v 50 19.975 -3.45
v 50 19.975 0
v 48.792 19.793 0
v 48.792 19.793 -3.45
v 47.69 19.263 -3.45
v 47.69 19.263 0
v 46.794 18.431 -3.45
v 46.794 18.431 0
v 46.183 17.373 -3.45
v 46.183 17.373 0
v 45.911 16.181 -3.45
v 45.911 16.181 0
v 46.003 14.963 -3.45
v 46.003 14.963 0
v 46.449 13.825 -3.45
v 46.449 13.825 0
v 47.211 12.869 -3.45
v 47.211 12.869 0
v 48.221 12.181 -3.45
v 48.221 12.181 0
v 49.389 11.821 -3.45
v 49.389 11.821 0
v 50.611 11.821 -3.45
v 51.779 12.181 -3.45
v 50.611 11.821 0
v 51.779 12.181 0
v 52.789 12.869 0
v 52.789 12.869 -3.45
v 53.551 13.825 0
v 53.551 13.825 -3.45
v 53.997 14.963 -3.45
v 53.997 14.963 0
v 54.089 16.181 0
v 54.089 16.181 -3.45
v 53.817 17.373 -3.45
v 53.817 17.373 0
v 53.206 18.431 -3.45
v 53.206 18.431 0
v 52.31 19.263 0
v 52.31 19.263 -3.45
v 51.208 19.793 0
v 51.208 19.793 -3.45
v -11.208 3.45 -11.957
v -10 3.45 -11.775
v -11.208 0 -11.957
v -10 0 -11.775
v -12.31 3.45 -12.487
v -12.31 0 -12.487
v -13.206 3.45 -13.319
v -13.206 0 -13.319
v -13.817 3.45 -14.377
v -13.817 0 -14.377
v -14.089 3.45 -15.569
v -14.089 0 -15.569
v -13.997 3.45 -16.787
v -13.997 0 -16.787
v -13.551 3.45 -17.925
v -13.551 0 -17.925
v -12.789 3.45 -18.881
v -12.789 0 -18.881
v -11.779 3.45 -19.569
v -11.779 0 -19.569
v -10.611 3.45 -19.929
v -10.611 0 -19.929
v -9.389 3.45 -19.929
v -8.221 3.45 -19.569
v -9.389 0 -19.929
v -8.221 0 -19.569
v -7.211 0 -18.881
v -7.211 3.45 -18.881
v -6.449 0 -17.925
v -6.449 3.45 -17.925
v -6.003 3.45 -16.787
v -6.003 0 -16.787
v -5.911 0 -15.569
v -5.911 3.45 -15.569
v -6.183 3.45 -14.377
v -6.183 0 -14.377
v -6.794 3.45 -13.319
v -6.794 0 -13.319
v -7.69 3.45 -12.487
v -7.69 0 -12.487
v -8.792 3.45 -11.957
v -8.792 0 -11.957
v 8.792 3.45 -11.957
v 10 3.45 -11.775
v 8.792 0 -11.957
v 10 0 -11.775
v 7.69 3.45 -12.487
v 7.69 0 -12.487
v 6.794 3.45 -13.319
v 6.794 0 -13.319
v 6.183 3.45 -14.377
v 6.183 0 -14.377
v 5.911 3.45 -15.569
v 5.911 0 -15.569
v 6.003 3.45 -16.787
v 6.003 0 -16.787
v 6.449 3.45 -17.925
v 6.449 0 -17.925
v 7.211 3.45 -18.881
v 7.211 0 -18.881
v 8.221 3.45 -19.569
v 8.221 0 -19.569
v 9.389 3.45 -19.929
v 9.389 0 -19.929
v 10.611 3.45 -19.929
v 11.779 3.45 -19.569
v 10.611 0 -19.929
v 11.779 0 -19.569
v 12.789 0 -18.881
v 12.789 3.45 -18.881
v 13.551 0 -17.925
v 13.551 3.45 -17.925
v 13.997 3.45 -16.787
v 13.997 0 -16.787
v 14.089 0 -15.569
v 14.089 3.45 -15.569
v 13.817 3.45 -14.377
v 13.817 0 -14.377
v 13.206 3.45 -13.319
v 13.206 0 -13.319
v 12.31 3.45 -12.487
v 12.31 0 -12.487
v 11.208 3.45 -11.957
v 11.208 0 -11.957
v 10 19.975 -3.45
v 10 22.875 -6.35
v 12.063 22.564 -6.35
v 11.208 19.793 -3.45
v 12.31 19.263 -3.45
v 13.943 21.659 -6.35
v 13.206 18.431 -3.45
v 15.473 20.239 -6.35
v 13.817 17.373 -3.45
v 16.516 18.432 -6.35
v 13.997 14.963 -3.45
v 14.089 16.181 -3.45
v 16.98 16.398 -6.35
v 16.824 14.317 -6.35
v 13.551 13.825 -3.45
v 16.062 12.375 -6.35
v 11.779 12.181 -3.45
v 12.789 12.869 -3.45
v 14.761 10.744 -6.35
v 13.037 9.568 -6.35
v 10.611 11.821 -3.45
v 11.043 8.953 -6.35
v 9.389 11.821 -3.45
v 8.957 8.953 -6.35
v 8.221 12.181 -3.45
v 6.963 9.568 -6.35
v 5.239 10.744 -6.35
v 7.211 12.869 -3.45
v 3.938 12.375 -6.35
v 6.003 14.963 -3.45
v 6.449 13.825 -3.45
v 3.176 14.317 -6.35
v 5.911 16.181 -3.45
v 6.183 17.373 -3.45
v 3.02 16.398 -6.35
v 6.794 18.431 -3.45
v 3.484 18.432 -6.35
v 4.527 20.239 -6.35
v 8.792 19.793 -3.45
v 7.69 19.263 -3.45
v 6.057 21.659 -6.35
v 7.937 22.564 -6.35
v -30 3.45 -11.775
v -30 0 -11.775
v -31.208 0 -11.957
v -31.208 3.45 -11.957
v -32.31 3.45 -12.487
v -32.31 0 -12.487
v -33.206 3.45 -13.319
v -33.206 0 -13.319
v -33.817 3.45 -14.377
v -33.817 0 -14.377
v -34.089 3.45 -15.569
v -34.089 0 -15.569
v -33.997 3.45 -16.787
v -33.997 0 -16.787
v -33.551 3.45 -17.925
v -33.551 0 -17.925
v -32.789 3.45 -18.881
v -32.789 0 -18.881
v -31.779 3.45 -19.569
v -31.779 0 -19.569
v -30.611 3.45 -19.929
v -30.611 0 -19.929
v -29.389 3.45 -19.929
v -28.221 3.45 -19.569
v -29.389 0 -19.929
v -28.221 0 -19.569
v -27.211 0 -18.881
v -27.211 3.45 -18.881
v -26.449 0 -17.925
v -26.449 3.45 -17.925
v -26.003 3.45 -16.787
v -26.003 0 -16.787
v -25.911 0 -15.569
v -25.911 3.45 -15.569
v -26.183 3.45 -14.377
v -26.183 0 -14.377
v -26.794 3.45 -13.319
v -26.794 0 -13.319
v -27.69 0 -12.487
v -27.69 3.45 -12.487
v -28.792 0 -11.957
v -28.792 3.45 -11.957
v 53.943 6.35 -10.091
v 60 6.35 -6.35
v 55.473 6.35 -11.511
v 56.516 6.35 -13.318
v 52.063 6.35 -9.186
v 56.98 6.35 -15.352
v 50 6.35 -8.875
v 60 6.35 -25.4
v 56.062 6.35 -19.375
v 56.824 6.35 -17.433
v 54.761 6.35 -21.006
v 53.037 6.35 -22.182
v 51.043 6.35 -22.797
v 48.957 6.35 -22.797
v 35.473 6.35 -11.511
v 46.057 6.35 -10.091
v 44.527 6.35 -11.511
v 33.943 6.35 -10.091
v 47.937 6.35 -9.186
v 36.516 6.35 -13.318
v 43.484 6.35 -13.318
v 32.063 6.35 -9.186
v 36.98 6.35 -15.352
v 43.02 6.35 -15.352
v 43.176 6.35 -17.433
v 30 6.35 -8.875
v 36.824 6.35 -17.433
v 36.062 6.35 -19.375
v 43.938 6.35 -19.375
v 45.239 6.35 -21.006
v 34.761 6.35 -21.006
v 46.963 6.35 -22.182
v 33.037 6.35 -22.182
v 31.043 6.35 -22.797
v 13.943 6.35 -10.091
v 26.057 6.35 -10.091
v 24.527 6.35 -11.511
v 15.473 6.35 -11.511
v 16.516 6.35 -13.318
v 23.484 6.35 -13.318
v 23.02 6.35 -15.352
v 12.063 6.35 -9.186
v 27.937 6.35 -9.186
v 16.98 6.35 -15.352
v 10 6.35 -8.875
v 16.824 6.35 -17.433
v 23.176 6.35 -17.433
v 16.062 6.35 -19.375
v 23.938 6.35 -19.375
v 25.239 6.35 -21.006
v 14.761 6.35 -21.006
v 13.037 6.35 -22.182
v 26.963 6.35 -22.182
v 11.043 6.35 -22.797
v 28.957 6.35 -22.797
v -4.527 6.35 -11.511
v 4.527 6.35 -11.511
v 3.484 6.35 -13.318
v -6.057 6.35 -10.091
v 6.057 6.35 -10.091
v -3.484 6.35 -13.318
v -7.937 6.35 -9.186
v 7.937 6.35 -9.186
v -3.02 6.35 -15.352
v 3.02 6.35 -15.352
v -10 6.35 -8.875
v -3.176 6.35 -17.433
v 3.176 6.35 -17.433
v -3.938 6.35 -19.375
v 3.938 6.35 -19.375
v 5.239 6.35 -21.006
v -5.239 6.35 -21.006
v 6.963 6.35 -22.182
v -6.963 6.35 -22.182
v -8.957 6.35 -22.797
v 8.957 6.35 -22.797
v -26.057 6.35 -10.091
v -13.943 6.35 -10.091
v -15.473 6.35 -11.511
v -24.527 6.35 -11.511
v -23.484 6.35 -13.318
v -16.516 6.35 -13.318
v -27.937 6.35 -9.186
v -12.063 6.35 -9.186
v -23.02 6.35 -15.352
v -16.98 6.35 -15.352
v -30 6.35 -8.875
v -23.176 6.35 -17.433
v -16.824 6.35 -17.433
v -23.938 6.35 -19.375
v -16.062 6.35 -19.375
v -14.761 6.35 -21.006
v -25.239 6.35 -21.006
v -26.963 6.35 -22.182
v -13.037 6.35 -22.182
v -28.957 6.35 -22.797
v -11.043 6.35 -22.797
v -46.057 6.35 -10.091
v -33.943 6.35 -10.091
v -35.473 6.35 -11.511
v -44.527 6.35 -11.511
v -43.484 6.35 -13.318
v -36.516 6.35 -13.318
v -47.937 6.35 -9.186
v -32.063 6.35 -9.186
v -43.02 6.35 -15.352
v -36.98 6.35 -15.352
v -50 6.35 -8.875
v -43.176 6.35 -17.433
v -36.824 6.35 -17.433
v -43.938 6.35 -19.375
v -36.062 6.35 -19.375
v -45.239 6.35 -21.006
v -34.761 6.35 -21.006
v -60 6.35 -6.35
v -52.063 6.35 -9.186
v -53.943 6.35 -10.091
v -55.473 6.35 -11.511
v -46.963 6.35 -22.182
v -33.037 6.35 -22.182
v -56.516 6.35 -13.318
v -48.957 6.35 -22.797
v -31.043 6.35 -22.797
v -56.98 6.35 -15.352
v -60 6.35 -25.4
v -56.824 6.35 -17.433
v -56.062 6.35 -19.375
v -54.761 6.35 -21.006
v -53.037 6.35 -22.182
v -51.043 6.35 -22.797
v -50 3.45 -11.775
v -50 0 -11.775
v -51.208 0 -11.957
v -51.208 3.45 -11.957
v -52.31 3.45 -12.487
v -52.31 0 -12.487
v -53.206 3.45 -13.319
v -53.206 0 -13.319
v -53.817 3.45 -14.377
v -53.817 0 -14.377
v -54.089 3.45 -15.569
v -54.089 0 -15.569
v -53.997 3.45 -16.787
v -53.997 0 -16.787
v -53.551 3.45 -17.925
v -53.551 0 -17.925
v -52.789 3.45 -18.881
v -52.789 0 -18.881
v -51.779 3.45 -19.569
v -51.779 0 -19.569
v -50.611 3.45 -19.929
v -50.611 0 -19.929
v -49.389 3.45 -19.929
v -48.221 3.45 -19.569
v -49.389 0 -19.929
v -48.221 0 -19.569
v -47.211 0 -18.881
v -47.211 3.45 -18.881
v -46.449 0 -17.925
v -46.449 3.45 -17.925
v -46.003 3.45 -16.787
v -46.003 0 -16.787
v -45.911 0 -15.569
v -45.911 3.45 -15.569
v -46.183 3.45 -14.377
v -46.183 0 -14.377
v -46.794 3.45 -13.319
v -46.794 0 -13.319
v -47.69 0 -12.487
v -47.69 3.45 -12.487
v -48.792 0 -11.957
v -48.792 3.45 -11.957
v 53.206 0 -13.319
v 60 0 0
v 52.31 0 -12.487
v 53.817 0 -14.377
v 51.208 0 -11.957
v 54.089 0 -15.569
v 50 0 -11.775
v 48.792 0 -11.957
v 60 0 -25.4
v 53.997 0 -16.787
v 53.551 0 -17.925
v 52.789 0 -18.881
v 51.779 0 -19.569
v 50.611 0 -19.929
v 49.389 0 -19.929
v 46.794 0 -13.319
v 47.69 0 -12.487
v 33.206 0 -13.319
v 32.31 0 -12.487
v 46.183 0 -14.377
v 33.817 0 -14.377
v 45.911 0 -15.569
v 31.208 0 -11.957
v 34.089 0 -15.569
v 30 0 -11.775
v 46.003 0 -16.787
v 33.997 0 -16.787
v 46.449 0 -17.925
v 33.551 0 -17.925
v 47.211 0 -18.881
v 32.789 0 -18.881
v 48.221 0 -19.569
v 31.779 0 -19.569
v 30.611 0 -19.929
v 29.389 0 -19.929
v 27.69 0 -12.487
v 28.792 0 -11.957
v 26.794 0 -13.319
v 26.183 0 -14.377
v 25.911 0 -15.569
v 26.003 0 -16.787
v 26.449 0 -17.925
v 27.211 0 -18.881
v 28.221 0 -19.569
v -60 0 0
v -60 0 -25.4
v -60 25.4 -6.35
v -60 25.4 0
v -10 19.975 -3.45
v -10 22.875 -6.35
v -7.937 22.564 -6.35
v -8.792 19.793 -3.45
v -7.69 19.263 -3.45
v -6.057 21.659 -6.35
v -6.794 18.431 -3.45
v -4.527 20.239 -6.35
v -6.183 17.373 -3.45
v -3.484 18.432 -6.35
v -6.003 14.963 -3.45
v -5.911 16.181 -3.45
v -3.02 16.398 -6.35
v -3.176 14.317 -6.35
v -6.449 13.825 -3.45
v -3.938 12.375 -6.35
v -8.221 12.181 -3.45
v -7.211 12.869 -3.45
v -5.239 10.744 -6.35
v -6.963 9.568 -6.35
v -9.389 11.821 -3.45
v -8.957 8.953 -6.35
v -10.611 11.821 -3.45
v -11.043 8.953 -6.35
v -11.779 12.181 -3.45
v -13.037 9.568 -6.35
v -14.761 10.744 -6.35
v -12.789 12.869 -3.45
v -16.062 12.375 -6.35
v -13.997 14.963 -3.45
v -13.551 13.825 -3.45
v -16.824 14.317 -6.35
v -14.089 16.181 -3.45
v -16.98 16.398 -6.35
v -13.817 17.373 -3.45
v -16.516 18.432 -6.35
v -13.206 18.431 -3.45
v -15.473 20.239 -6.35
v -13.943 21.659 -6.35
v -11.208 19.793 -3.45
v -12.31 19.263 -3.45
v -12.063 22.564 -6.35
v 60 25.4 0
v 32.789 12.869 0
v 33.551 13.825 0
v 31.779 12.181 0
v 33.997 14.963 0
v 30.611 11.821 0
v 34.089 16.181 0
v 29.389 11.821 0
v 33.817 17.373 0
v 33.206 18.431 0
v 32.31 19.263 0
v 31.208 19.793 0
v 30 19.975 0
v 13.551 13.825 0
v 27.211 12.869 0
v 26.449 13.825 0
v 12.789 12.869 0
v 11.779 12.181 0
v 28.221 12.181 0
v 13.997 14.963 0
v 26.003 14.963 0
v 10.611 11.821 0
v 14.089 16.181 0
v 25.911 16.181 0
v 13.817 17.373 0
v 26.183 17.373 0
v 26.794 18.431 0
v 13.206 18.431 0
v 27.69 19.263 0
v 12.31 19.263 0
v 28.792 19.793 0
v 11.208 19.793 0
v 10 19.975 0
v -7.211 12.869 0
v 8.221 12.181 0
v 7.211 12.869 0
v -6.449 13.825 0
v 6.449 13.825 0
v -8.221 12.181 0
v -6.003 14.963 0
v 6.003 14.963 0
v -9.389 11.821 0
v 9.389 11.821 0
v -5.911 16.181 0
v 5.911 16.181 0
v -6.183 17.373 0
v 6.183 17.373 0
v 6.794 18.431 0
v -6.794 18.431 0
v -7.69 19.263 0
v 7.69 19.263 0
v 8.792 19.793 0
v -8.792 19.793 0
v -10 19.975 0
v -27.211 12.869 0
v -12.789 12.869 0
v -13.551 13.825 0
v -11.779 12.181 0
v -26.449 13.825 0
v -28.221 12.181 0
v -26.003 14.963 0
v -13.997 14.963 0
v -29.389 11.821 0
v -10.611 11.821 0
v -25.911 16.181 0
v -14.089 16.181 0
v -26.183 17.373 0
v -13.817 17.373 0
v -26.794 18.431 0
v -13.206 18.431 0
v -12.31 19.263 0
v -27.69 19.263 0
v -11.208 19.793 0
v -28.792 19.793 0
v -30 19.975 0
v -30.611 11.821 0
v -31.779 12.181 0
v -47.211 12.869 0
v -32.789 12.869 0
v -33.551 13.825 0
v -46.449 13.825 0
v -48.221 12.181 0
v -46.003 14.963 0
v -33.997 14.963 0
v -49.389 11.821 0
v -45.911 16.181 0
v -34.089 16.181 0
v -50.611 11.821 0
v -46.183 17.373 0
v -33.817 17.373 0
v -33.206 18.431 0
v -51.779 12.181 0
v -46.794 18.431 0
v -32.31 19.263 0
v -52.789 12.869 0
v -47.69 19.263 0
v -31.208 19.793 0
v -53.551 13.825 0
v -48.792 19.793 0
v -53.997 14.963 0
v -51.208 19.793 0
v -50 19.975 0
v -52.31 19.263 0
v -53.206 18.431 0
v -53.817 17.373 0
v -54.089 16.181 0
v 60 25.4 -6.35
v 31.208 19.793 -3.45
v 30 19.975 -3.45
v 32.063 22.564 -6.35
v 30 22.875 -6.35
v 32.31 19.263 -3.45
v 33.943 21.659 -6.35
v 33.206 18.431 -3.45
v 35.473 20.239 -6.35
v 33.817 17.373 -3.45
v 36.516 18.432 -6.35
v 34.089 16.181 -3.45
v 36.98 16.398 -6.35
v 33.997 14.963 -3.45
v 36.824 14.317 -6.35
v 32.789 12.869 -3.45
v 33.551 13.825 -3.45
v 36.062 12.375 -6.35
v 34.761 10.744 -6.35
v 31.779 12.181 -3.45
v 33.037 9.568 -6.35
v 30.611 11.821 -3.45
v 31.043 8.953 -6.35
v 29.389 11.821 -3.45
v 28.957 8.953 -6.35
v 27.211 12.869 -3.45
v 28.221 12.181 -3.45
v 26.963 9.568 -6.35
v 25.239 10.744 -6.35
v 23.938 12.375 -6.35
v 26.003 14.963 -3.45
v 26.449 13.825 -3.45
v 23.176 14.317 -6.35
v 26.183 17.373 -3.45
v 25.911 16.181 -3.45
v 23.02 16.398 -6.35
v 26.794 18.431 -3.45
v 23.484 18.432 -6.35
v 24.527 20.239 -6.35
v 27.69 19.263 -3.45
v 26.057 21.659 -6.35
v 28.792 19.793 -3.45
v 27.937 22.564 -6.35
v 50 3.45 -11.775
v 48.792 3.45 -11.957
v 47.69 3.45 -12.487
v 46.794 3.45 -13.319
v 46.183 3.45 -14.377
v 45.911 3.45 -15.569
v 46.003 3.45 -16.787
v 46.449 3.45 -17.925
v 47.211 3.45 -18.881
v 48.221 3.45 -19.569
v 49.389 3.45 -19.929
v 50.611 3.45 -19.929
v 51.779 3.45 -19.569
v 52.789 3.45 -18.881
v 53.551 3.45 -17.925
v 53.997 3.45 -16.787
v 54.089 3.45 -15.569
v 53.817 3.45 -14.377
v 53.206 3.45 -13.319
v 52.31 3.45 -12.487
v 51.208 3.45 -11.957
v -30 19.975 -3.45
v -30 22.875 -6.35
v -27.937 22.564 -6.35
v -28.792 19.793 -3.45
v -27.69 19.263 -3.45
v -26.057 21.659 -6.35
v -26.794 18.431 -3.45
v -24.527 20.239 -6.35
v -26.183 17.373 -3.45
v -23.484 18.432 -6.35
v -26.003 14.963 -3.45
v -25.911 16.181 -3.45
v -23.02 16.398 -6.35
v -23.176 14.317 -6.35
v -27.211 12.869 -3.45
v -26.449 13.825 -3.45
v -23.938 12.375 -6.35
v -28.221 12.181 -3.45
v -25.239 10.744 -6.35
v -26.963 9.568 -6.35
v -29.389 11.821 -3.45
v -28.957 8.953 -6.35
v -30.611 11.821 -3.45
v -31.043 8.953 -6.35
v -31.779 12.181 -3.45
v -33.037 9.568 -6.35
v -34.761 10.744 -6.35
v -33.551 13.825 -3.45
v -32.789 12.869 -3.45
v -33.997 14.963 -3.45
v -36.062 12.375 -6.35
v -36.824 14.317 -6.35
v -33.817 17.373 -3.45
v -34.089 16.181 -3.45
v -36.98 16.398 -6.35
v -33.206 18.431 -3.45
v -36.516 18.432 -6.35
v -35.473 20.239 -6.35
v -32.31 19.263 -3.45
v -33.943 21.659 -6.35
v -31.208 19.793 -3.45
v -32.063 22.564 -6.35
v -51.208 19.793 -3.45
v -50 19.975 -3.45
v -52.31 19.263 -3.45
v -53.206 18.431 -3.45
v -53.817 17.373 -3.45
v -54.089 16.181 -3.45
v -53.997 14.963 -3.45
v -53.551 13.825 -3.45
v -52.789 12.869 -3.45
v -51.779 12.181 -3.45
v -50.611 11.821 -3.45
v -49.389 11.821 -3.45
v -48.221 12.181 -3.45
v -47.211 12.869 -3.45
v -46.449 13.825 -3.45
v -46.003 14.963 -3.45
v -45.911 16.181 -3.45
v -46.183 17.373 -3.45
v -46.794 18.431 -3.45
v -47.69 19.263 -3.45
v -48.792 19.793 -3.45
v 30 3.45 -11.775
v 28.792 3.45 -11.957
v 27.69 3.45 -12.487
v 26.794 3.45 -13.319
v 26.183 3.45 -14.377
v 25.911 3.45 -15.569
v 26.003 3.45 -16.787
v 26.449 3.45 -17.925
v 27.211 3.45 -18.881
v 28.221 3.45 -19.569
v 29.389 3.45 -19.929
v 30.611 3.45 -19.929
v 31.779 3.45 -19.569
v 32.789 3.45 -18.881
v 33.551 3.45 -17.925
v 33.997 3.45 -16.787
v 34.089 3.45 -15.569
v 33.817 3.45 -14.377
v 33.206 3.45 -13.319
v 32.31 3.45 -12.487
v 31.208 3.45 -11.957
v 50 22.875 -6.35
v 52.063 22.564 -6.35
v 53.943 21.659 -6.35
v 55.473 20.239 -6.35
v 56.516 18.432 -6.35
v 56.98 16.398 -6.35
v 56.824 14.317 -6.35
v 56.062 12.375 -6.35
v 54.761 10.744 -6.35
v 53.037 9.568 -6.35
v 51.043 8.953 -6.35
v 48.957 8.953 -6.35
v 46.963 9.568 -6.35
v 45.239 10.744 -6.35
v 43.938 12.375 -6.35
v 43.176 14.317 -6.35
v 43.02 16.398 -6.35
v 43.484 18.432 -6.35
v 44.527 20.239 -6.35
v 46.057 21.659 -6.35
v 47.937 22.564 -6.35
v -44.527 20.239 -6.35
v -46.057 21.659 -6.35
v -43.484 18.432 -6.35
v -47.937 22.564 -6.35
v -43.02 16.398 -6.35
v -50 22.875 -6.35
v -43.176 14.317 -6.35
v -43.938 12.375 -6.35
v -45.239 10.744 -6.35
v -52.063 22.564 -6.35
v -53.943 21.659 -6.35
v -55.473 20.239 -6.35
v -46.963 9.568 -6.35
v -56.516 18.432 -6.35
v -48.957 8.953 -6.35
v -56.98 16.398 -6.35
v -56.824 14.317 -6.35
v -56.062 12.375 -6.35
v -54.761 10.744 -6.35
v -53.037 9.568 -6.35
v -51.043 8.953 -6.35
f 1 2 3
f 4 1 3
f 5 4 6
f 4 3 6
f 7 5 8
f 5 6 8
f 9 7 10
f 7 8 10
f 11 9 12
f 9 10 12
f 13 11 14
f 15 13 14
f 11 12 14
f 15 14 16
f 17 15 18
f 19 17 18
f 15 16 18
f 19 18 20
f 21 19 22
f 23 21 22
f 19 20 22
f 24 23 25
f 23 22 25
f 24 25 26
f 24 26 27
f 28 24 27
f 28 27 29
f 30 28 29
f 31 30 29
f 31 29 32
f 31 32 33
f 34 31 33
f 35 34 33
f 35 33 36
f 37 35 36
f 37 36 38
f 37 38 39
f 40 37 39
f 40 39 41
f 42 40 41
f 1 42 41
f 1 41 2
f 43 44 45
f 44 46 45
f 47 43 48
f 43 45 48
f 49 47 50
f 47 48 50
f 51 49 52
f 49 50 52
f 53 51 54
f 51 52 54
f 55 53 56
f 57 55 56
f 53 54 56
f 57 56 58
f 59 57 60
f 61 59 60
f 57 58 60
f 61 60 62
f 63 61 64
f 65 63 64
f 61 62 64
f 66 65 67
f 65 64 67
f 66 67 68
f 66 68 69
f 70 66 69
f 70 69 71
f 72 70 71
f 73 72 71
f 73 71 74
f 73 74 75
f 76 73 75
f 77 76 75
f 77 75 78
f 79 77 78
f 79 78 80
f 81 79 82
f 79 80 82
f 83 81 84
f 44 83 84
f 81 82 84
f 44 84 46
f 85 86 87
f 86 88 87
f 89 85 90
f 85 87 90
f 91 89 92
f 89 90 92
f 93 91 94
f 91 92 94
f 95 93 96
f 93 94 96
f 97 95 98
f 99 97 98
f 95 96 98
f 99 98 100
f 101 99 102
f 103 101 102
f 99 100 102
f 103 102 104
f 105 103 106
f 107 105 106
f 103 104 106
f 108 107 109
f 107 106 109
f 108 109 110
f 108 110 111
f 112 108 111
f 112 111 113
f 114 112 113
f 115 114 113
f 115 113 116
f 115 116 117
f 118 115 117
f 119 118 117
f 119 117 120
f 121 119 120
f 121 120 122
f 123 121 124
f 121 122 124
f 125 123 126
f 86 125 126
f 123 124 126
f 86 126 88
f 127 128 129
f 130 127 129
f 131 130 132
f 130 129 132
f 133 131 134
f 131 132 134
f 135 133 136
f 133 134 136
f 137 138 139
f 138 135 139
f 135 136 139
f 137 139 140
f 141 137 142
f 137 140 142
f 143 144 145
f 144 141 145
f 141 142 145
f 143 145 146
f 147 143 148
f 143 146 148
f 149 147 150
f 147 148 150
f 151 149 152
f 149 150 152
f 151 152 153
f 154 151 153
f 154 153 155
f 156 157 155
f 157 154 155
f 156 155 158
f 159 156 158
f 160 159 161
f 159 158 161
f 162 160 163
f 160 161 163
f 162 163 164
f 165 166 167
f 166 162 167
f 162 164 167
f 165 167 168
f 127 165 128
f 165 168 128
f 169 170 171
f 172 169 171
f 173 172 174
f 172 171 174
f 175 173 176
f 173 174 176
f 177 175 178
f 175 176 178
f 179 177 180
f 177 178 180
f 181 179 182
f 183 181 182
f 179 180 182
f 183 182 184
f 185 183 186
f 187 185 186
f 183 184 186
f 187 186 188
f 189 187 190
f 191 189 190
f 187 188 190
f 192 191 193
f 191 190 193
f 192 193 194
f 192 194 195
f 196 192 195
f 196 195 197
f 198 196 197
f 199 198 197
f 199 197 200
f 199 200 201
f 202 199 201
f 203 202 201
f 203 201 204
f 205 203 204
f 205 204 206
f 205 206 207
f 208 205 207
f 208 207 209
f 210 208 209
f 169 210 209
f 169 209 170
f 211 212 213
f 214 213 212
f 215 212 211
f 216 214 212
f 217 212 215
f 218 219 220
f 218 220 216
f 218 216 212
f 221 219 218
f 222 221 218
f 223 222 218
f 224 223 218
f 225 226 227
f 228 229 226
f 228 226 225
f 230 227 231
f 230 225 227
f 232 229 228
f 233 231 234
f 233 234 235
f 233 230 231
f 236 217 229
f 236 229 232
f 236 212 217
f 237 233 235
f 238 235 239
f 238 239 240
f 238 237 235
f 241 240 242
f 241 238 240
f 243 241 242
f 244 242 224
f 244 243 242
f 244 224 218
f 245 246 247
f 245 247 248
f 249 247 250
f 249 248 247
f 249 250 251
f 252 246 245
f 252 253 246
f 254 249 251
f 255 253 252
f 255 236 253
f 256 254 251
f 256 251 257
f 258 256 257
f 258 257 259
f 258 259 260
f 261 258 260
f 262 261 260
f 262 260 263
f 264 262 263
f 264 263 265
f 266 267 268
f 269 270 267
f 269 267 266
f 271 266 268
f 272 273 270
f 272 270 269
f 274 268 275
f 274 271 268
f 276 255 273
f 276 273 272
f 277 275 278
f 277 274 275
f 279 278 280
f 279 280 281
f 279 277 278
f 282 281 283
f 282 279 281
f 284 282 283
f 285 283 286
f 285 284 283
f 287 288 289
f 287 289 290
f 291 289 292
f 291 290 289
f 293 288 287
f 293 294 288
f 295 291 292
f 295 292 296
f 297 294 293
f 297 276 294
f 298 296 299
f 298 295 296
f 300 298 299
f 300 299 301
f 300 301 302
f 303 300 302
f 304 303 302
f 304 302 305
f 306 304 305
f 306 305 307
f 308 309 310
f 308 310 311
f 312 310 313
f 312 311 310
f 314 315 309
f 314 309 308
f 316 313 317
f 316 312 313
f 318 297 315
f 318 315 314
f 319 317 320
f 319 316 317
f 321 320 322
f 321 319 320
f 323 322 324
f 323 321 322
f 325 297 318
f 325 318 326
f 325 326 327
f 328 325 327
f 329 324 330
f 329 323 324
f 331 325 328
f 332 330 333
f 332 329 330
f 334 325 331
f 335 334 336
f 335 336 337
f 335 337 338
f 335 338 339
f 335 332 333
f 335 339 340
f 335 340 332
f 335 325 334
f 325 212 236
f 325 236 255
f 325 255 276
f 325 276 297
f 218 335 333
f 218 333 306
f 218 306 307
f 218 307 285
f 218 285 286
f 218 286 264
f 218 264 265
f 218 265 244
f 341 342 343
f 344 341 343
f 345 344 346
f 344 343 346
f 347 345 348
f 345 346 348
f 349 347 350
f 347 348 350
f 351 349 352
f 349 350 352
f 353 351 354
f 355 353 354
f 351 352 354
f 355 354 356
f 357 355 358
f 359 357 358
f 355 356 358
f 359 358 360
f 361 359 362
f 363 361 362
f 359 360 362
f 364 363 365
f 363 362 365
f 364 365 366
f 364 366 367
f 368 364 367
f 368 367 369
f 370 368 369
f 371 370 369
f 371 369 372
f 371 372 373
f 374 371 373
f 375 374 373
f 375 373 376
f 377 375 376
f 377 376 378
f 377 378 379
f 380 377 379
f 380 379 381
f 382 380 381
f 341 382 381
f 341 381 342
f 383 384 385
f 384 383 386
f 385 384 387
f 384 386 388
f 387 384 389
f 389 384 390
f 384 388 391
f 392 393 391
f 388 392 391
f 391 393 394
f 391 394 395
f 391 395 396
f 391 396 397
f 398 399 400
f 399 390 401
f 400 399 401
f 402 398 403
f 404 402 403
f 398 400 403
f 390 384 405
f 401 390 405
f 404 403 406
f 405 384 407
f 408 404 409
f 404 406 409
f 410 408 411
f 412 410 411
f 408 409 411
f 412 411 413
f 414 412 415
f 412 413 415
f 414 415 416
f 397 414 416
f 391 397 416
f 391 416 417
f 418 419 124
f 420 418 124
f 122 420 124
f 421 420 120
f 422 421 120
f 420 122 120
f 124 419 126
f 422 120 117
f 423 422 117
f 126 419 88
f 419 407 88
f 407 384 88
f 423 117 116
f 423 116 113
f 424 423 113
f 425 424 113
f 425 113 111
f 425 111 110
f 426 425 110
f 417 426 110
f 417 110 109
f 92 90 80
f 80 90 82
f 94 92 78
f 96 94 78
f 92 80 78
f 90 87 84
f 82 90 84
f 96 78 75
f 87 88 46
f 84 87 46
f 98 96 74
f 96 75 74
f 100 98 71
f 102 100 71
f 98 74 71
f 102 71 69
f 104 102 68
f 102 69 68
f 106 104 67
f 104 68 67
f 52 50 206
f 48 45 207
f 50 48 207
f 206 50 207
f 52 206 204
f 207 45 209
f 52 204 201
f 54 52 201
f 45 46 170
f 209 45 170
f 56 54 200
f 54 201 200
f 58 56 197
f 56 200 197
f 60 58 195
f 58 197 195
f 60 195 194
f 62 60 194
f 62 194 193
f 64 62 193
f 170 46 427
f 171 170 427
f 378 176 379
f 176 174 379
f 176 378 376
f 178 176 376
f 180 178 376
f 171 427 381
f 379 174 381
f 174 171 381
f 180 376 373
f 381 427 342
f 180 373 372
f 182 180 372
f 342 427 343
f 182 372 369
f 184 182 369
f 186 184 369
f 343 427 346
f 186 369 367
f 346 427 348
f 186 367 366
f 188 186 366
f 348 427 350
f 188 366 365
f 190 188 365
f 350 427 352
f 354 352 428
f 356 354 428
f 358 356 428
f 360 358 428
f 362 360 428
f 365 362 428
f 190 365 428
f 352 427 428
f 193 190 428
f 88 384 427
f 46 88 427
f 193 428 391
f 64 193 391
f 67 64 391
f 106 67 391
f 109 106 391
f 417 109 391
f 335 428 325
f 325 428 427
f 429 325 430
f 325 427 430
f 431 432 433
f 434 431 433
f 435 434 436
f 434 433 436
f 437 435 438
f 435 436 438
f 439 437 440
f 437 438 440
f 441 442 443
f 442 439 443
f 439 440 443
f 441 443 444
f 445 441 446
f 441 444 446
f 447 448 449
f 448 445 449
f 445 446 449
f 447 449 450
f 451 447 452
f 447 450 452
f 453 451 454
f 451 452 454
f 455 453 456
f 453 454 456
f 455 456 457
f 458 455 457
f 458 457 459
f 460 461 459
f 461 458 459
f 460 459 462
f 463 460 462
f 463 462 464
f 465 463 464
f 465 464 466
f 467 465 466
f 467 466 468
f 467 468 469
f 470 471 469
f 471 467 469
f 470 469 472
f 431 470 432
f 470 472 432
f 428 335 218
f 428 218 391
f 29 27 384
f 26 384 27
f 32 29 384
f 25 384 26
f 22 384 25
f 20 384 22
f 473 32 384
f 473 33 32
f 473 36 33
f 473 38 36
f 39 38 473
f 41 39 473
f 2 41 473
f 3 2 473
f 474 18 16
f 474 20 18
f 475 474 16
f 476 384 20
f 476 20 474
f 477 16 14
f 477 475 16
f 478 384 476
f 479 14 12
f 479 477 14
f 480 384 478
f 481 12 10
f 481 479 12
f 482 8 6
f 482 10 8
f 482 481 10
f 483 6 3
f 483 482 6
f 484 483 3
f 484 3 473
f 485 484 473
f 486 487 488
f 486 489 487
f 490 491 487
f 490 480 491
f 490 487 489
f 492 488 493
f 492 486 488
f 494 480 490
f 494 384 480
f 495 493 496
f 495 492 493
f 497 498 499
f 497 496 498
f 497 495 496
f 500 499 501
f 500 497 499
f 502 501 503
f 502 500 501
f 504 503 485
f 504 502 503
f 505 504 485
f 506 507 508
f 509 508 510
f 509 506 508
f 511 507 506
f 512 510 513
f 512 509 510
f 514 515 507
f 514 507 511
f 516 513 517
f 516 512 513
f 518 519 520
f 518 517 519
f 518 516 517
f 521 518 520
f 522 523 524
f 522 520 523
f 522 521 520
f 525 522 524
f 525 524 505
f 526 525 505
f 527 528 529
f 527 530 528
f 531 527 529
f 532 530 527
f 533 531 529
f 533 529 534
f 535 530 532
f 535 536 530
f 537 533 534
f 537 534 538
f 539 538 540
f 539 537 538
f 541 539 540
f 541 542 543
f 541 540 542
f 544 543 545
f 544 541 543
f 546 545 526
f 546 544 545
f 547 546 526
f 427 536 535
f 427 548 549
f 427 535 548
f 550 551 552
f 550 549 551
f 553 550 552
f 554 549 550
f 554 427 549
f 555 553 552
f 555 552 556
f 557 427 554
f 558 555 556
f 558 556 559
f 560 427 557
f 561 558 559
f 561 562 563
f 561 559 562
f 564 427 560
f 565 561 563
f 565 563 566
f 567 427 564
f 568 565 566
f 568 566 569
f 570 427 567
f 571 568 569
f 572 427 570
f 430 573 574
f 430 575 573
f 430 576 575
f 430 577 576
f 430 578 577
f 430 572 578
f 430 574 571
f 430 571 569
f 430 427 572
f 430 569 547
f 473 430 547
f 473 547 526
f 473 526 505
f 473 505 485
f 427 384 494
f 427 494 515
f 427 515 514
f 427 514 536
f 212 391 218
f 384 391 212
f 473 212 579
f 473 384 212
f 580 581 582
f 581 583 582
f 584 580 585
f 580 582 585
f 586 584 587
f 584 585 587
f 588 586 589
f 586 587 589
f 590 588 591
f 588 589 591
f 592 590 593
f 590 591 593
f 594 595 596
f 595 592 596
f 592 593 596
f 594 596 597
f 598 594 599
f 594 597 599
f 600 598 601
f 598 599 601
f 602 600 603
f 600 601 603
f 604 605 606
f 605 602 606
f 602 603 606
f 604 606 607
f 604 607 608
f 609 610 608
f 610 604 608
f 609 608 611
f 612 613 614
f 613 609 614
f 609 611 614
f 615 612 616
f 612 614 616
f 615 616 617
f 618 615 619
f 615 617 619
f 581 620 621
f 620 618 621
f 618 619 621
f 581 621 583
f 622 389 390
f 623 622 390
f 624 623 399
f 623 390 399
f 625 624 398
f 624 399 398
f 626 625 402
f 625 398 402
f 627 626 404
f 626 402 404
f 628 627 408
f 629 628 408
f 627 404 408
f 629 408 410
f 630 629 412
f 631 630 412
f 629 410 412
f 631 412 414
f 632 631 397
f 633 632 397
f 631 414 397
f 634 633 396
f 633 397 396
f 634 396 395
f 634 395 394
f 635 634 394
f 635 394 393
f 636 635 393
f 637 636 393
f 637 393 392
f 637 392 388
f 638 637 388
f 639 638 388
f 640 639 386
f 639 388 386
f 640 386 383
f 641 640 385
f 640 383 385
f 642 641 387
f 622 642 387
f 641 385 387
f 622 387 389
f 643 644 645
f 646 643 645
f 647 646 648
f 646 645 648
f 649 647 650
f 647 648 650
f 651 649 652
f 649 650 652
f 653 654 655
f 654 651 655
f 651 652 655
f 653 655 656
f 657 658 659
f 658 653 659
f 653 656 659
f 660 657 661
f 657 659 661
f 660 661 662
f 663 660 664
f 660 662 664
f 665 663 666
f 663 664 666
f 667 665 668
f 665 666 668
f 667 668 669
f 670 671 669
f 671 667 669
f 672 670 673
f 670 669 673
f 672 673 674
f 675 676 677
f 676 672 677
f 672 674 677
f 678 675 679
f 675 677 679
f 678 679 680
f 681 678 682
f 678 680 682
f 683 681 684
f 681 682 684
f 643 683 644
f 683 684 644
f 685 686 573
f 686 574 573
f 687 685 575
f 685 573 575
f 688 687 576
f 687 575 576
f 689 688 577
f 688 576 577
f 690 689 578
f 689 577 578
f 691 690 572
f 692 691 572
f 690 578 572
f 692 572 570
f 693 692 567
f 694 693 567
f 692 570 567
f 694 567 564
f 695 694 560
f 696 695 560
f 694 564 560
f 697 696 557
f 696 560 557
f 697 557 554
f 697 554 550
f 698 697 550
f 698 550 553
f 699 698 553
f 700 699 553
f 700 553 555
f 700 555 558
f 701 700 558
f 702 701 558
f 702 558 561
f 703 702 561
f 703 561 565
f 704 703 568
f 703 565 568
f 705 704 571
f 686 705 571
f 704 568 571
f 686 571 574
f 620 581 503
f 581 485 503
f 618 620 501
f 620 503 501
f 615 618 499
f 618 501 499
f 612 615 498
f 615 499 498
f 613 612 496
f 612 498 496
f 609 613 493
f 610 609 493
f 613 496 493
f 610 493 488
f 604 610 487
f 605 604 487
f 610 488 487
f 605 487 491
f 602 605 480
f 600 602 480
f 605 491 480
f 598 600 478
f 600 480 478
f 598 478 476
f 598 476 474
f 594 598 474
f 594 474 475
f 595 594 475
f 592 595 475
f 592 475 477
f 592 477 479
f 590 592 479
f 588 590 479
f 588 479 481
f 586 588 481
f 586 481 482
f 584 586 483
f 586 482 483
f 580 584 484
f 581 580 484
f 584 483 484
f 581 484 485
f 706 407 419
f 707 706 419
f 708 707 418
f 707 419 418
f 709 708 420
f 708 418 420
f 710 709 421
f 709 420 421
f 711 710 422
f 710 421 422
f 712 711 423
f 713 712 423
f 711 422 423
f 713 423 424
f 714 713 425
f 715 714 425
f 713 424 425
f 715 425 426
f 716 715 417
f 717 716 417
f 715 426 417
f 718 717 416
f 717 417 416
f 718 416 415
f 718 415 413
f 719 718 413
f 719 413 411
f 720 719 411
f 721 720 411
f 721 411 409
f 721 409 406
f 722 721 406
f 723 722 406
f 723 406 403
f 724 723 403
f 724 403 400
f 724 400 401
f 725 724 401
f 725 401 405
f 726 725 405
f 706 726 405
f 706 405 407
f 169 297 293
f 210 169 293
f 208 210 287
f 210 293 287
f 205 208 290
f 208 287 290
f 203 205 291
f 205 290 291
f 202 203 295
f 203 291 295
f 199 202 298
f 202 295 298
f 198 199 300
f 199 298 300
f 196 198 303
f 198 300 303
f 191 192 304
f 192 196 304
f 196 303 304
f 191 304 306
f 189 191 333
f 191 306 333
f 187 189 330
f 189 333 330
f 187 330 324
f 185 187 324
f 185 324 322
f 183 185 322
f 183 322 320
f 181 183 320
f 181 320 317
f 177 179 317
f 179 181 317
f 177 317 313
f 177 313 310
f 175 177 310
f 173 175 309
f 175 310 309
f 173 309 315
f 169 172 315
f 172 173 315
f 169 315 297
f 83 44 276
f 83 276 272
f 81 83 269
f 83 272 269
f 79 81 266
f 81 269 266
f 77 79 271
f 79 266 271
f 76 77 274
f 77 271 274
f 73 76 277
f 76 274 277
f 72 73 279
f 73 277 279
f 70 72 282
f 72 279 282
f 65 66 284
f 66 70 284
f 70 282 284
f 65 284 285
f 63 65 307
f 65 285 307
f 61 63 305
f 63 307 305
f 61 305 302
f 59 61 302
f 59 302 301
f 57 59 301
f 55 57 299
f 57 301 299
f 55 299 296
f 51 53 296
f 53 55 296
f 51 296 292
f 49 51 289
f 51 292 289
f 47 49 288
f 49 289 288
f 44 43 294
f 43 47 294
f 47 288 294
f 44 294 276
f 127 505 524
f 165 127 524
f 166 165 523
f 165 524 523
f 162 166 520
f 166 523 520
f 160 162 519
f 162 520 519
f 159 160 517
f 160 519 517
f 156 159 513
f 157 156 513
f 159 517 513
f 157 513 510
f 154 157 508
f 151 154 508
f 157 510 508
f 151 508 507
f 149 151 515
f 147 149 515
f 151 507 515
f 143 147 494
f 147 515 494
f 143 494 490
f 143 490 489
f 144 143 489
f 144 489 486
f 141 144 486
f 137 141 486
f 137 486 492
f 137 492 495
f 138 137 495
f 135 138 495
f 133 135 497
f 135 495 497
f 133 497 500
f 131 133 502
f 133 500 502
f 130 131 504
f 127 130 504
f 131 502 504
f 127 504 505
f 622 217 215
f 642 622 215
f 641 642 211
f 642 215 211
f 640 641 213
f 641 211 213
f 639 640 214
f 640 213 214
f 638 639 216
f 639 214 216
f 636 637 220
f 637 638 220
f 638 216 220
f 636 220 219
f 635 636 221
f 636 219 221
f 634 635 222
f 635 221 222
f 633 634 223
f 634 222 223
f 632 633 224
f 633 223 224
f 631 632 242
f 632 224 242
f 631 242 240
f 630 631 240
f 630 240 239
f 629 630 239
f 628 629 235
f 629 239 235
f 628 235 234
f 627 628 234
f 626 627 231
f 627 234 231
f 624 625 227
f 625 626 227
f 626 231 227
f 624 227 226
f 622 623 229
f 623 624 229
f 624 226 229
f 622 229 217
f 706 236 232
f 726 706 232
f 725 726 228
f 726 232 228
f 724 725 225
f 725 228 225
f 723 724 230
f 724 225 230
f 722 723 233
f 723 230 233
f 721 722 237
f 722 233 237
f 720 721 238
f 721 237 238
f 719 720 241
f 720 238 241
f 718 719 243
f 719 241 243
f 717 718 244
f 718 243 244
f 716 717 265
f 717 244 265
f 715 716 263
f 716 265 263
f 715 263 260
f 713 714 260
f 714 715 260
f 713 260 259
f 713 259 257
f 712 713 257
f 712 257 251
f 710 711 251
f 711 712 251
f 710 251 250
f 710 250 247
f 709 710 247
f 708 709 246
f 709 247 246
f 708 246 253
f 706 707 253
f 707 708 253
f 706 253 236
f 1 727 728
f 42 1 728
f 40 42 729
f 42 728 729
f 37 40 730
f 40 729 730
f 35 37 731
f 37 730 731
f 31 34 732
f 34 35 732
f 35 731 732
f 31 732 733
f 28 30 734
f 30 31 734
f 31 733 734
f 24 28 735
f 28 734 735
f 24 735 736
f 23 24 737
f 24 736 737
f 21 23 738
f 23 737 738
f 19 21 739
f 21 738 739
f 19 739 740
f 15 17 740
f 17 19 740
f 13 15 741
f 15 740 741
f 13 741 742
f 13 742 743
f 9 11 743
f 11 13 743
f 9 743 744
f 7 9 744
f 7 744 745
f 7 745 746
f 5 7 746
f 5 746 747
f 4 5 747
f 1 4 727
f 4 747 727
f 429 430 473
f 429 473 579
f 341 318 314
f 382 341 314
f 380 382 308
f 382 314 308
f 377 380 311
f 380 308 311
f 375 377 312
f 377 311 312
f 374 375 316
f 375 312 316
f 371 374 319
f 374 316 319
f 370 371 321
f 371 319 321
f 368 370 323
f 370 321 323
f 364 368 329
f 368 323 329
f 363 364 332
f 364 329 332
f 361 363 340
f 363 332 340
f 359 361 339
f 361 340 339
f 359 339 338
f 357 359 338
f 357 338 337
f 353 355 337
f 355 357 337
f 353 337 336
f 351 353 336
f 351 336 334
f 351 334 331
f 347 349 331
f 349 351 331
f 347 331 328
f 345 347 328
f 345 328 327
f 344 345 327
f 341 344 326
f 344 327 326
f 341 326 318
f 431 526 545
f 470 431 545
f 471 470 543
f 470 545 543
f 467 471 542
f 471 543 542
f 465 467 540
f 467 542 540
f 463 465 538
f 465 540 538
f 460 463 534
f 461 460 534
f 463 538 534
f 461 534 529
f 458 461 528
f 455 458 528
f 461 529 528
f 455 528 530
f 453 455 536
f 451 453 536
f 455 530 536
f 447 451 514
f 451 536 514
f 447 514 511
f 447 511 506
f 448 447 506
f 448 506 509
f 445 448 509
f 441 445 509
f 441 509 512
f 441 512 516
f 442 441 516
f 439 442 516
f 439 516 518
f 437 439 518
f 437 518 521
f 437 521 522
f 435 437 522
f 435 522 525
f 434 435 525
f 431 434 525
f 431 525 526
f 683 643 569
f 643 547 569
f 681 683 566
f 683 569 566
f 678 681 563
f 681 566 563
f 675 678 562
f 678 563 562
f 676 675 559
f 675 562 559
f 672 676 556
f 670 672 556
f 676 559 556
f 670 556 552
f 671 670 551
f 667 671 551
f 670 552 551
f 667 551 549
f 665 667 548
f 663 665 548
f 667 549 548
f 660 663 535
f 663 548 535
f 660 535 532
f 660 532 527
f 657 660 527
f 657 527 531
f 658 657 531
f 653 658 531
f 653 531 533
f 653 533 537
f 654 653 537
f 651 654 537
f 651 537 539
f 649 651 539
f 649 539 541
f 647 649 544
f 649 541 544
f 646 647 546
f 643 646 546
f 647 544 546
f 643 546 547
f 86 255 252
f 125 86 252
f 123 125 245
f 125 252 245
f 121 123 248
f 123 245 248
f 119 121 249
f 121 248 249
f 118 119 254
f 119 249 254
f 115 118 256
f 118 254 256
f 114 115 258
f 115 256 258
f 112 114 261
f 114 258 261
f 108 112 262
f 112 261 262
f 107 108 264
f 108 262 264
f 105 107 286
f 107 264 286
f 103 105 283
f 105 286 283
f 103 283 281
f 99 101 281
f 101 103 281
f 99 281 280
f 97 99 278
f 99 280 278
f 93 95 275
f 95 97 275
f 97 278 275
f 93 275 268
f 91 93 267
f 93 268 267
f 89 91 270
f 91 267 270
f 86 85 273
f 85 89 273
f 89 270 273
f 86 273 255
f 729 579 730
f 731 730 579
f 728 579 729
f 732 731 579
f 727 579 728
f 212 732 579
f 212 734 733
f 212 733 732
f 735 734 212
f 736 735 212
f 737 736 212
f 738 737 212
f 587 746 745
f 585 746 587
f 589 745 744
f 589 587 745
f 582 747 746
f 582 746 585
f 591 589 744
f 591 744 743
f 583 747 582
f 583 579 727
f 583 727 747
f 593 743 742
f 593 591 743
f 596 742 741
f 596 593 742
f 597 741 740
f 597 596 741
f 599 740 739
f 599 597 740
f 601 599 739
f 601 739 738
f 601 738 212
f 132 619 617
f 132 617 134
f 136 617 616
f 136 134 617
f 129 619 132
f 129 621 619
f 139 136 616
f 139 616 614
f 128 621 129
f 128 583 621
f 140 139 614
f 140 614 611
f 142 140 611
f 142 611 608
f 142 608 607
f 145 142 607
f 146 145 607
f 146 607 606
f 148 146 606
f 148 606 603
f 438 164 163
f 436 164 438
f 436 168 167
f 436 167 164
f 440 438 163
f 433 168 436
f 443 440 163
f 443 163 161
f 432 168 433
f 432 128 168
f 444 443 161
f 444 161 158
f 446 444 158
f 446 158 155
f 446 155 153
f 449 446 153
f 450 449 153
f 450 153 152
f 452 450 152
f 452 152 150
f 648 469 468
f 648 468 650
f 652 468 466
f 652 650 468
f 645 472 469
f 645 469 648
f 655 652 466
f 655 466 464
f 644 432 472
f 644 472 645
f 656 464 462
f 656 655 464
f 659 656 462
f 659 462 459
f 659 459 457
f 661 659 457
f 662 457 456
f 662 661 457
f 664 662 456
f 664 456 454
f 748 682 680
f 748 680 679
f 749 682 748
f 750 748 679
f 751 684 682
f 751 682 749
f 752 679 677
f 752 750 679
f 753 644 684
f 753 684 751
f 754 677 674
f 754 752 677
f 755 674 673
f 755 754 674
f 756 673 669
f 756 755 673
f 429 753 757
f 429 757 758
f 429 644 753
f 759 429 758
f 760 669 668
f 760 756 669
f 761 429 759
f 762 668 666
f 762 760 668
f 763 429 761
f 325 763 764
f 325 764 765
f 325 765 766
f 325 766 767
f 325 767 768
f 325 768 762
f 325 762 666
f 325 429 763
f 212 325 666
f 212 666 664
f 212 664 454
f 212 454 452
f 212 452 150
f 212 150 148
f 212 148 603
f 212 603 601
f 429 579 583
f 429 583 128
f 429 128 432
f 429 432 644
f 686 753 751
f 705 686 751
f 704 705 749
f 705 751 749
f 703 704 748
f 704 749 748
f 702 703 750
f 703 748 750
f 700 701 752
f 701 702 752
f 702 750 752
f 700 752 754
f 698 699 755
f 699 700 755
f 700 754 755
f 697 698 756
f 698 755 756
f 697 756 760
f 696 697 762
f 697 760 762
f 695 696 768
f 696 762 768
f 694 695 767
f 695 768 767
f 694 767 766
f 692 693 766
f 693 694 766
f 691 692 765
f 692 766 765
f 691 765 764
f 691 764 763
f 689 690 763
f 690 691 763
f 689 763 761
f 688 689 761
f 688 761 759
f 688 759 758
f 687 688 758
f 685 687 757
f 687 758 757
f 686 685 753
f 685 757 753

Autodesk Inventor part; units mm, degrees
ref_plane "YZ Plane" through (0, 0, 0) normal (1, 0, 0) x (0, 1, 0)
ref_plane "XZ Plane" through (0, 0, 0) normal (0, 1, 0) x (-1, 0, 0)
ref_plane "XY Plane" through (0, 0, 0) normal (0, 0, 1) x (1, 0, 0)
sketch "Sketch1" plane through (0, 0, 0) normal (1, 0, 0) x (0, 1, 0)
  line L0 (0, 0) -> (25.4, 0)
  line L1 (0, 0) -> (0, -25.4)
  line L2 (25.4, -6.35) -> (6.35, -6.35)
  line L3 (6.35, -6.35) -> (6.35, -25.4)
  line L4 (6.35, -25.4) -> (0, -25.4)
  line L5 (25.4, 0) -> (25.4, -6.35)
  dimension "d0" = 25.4
  dimension "d1" = 25.4
  dimension "d2" = 6.35
extrude "Extrusion1" add sketch "Sketch1" along normal mid plane 120
sketch "Sketch2" plane through (-60, 6.35, -6.35) normal (0, 1, 0) x (1, 0, 0)
  circle A0 centre (10, 9.525) radius 4.1
  line L0 (0, 0) -> (0, 19.05) construction
  line L1 (0, 19.05) -> (120, 19.05) construction
  circle A1 centre (30, 9.525) radius 4.1
  circle A2 centre (50, 9.525) radius 4.1
  circle A3 centre (70, 9.525) radius 4.1
  circle A4 centre (90, 9.525) radius 4.1
  circle A5 centre (110, 9.525) radius 4.1
  point P0 (60, -6.35)
  point P1 (0, 9.525)
  point P2 (0, 9.525)
  dimension "d5" = 8.2
  dimension "d6" = 10
  dimension "d9" = 20
hole "Hole1" at (50, 6.35, -15.875) at (30, 6.35, -15.875) at (10, 6.35, -15.875) at (-10, 6.35, -15.875) at (-30, 6.35, -15.875) at (-50, 6.35, -15.875) direction (0, -1, 0) diameter 8.2 end through all countersink diameter 14 countersink angle 90
sketch "Sketch3" plane through (60, 25.4, -6.35) normal (0, 0, -1) x (-1, 0, 0)
  circle A0 centre (10, -9.525) radius 4
  line L0 (0, -19.05) -> (0, 0) construction
  line L1 (120, 0) -> (0, 0) construction
  circle A1 centre (30, -9.525) radius 4
  circle A2 centre (50, -9.525) radius 4
  circle A3 centre (70, -9.525) radius 4
  circle A4 centre (90, -9.525) radius 4
  circle A5 centre (110, -9.525) radius 4
  point P0 (60, -25.4)
  point P1 (0, -9.525)
  dimension "d21" = 8
  dimension "d22" = 10
  dimension "d25" = 20
hole "Hole2" at (50, 15.875, -6.35) at (30, 15.875, -6.35) at (10, 15.875, -6.35) at (-10, 15.875, -6.35) at (-30, 15.875, -6.35) at (-50, 15.875, -6.35) direction (0, 0, 1) diameter 8.2 end through all countersink diameter 14 countersink angle 90
properties part number "MotorMountingBracket"
